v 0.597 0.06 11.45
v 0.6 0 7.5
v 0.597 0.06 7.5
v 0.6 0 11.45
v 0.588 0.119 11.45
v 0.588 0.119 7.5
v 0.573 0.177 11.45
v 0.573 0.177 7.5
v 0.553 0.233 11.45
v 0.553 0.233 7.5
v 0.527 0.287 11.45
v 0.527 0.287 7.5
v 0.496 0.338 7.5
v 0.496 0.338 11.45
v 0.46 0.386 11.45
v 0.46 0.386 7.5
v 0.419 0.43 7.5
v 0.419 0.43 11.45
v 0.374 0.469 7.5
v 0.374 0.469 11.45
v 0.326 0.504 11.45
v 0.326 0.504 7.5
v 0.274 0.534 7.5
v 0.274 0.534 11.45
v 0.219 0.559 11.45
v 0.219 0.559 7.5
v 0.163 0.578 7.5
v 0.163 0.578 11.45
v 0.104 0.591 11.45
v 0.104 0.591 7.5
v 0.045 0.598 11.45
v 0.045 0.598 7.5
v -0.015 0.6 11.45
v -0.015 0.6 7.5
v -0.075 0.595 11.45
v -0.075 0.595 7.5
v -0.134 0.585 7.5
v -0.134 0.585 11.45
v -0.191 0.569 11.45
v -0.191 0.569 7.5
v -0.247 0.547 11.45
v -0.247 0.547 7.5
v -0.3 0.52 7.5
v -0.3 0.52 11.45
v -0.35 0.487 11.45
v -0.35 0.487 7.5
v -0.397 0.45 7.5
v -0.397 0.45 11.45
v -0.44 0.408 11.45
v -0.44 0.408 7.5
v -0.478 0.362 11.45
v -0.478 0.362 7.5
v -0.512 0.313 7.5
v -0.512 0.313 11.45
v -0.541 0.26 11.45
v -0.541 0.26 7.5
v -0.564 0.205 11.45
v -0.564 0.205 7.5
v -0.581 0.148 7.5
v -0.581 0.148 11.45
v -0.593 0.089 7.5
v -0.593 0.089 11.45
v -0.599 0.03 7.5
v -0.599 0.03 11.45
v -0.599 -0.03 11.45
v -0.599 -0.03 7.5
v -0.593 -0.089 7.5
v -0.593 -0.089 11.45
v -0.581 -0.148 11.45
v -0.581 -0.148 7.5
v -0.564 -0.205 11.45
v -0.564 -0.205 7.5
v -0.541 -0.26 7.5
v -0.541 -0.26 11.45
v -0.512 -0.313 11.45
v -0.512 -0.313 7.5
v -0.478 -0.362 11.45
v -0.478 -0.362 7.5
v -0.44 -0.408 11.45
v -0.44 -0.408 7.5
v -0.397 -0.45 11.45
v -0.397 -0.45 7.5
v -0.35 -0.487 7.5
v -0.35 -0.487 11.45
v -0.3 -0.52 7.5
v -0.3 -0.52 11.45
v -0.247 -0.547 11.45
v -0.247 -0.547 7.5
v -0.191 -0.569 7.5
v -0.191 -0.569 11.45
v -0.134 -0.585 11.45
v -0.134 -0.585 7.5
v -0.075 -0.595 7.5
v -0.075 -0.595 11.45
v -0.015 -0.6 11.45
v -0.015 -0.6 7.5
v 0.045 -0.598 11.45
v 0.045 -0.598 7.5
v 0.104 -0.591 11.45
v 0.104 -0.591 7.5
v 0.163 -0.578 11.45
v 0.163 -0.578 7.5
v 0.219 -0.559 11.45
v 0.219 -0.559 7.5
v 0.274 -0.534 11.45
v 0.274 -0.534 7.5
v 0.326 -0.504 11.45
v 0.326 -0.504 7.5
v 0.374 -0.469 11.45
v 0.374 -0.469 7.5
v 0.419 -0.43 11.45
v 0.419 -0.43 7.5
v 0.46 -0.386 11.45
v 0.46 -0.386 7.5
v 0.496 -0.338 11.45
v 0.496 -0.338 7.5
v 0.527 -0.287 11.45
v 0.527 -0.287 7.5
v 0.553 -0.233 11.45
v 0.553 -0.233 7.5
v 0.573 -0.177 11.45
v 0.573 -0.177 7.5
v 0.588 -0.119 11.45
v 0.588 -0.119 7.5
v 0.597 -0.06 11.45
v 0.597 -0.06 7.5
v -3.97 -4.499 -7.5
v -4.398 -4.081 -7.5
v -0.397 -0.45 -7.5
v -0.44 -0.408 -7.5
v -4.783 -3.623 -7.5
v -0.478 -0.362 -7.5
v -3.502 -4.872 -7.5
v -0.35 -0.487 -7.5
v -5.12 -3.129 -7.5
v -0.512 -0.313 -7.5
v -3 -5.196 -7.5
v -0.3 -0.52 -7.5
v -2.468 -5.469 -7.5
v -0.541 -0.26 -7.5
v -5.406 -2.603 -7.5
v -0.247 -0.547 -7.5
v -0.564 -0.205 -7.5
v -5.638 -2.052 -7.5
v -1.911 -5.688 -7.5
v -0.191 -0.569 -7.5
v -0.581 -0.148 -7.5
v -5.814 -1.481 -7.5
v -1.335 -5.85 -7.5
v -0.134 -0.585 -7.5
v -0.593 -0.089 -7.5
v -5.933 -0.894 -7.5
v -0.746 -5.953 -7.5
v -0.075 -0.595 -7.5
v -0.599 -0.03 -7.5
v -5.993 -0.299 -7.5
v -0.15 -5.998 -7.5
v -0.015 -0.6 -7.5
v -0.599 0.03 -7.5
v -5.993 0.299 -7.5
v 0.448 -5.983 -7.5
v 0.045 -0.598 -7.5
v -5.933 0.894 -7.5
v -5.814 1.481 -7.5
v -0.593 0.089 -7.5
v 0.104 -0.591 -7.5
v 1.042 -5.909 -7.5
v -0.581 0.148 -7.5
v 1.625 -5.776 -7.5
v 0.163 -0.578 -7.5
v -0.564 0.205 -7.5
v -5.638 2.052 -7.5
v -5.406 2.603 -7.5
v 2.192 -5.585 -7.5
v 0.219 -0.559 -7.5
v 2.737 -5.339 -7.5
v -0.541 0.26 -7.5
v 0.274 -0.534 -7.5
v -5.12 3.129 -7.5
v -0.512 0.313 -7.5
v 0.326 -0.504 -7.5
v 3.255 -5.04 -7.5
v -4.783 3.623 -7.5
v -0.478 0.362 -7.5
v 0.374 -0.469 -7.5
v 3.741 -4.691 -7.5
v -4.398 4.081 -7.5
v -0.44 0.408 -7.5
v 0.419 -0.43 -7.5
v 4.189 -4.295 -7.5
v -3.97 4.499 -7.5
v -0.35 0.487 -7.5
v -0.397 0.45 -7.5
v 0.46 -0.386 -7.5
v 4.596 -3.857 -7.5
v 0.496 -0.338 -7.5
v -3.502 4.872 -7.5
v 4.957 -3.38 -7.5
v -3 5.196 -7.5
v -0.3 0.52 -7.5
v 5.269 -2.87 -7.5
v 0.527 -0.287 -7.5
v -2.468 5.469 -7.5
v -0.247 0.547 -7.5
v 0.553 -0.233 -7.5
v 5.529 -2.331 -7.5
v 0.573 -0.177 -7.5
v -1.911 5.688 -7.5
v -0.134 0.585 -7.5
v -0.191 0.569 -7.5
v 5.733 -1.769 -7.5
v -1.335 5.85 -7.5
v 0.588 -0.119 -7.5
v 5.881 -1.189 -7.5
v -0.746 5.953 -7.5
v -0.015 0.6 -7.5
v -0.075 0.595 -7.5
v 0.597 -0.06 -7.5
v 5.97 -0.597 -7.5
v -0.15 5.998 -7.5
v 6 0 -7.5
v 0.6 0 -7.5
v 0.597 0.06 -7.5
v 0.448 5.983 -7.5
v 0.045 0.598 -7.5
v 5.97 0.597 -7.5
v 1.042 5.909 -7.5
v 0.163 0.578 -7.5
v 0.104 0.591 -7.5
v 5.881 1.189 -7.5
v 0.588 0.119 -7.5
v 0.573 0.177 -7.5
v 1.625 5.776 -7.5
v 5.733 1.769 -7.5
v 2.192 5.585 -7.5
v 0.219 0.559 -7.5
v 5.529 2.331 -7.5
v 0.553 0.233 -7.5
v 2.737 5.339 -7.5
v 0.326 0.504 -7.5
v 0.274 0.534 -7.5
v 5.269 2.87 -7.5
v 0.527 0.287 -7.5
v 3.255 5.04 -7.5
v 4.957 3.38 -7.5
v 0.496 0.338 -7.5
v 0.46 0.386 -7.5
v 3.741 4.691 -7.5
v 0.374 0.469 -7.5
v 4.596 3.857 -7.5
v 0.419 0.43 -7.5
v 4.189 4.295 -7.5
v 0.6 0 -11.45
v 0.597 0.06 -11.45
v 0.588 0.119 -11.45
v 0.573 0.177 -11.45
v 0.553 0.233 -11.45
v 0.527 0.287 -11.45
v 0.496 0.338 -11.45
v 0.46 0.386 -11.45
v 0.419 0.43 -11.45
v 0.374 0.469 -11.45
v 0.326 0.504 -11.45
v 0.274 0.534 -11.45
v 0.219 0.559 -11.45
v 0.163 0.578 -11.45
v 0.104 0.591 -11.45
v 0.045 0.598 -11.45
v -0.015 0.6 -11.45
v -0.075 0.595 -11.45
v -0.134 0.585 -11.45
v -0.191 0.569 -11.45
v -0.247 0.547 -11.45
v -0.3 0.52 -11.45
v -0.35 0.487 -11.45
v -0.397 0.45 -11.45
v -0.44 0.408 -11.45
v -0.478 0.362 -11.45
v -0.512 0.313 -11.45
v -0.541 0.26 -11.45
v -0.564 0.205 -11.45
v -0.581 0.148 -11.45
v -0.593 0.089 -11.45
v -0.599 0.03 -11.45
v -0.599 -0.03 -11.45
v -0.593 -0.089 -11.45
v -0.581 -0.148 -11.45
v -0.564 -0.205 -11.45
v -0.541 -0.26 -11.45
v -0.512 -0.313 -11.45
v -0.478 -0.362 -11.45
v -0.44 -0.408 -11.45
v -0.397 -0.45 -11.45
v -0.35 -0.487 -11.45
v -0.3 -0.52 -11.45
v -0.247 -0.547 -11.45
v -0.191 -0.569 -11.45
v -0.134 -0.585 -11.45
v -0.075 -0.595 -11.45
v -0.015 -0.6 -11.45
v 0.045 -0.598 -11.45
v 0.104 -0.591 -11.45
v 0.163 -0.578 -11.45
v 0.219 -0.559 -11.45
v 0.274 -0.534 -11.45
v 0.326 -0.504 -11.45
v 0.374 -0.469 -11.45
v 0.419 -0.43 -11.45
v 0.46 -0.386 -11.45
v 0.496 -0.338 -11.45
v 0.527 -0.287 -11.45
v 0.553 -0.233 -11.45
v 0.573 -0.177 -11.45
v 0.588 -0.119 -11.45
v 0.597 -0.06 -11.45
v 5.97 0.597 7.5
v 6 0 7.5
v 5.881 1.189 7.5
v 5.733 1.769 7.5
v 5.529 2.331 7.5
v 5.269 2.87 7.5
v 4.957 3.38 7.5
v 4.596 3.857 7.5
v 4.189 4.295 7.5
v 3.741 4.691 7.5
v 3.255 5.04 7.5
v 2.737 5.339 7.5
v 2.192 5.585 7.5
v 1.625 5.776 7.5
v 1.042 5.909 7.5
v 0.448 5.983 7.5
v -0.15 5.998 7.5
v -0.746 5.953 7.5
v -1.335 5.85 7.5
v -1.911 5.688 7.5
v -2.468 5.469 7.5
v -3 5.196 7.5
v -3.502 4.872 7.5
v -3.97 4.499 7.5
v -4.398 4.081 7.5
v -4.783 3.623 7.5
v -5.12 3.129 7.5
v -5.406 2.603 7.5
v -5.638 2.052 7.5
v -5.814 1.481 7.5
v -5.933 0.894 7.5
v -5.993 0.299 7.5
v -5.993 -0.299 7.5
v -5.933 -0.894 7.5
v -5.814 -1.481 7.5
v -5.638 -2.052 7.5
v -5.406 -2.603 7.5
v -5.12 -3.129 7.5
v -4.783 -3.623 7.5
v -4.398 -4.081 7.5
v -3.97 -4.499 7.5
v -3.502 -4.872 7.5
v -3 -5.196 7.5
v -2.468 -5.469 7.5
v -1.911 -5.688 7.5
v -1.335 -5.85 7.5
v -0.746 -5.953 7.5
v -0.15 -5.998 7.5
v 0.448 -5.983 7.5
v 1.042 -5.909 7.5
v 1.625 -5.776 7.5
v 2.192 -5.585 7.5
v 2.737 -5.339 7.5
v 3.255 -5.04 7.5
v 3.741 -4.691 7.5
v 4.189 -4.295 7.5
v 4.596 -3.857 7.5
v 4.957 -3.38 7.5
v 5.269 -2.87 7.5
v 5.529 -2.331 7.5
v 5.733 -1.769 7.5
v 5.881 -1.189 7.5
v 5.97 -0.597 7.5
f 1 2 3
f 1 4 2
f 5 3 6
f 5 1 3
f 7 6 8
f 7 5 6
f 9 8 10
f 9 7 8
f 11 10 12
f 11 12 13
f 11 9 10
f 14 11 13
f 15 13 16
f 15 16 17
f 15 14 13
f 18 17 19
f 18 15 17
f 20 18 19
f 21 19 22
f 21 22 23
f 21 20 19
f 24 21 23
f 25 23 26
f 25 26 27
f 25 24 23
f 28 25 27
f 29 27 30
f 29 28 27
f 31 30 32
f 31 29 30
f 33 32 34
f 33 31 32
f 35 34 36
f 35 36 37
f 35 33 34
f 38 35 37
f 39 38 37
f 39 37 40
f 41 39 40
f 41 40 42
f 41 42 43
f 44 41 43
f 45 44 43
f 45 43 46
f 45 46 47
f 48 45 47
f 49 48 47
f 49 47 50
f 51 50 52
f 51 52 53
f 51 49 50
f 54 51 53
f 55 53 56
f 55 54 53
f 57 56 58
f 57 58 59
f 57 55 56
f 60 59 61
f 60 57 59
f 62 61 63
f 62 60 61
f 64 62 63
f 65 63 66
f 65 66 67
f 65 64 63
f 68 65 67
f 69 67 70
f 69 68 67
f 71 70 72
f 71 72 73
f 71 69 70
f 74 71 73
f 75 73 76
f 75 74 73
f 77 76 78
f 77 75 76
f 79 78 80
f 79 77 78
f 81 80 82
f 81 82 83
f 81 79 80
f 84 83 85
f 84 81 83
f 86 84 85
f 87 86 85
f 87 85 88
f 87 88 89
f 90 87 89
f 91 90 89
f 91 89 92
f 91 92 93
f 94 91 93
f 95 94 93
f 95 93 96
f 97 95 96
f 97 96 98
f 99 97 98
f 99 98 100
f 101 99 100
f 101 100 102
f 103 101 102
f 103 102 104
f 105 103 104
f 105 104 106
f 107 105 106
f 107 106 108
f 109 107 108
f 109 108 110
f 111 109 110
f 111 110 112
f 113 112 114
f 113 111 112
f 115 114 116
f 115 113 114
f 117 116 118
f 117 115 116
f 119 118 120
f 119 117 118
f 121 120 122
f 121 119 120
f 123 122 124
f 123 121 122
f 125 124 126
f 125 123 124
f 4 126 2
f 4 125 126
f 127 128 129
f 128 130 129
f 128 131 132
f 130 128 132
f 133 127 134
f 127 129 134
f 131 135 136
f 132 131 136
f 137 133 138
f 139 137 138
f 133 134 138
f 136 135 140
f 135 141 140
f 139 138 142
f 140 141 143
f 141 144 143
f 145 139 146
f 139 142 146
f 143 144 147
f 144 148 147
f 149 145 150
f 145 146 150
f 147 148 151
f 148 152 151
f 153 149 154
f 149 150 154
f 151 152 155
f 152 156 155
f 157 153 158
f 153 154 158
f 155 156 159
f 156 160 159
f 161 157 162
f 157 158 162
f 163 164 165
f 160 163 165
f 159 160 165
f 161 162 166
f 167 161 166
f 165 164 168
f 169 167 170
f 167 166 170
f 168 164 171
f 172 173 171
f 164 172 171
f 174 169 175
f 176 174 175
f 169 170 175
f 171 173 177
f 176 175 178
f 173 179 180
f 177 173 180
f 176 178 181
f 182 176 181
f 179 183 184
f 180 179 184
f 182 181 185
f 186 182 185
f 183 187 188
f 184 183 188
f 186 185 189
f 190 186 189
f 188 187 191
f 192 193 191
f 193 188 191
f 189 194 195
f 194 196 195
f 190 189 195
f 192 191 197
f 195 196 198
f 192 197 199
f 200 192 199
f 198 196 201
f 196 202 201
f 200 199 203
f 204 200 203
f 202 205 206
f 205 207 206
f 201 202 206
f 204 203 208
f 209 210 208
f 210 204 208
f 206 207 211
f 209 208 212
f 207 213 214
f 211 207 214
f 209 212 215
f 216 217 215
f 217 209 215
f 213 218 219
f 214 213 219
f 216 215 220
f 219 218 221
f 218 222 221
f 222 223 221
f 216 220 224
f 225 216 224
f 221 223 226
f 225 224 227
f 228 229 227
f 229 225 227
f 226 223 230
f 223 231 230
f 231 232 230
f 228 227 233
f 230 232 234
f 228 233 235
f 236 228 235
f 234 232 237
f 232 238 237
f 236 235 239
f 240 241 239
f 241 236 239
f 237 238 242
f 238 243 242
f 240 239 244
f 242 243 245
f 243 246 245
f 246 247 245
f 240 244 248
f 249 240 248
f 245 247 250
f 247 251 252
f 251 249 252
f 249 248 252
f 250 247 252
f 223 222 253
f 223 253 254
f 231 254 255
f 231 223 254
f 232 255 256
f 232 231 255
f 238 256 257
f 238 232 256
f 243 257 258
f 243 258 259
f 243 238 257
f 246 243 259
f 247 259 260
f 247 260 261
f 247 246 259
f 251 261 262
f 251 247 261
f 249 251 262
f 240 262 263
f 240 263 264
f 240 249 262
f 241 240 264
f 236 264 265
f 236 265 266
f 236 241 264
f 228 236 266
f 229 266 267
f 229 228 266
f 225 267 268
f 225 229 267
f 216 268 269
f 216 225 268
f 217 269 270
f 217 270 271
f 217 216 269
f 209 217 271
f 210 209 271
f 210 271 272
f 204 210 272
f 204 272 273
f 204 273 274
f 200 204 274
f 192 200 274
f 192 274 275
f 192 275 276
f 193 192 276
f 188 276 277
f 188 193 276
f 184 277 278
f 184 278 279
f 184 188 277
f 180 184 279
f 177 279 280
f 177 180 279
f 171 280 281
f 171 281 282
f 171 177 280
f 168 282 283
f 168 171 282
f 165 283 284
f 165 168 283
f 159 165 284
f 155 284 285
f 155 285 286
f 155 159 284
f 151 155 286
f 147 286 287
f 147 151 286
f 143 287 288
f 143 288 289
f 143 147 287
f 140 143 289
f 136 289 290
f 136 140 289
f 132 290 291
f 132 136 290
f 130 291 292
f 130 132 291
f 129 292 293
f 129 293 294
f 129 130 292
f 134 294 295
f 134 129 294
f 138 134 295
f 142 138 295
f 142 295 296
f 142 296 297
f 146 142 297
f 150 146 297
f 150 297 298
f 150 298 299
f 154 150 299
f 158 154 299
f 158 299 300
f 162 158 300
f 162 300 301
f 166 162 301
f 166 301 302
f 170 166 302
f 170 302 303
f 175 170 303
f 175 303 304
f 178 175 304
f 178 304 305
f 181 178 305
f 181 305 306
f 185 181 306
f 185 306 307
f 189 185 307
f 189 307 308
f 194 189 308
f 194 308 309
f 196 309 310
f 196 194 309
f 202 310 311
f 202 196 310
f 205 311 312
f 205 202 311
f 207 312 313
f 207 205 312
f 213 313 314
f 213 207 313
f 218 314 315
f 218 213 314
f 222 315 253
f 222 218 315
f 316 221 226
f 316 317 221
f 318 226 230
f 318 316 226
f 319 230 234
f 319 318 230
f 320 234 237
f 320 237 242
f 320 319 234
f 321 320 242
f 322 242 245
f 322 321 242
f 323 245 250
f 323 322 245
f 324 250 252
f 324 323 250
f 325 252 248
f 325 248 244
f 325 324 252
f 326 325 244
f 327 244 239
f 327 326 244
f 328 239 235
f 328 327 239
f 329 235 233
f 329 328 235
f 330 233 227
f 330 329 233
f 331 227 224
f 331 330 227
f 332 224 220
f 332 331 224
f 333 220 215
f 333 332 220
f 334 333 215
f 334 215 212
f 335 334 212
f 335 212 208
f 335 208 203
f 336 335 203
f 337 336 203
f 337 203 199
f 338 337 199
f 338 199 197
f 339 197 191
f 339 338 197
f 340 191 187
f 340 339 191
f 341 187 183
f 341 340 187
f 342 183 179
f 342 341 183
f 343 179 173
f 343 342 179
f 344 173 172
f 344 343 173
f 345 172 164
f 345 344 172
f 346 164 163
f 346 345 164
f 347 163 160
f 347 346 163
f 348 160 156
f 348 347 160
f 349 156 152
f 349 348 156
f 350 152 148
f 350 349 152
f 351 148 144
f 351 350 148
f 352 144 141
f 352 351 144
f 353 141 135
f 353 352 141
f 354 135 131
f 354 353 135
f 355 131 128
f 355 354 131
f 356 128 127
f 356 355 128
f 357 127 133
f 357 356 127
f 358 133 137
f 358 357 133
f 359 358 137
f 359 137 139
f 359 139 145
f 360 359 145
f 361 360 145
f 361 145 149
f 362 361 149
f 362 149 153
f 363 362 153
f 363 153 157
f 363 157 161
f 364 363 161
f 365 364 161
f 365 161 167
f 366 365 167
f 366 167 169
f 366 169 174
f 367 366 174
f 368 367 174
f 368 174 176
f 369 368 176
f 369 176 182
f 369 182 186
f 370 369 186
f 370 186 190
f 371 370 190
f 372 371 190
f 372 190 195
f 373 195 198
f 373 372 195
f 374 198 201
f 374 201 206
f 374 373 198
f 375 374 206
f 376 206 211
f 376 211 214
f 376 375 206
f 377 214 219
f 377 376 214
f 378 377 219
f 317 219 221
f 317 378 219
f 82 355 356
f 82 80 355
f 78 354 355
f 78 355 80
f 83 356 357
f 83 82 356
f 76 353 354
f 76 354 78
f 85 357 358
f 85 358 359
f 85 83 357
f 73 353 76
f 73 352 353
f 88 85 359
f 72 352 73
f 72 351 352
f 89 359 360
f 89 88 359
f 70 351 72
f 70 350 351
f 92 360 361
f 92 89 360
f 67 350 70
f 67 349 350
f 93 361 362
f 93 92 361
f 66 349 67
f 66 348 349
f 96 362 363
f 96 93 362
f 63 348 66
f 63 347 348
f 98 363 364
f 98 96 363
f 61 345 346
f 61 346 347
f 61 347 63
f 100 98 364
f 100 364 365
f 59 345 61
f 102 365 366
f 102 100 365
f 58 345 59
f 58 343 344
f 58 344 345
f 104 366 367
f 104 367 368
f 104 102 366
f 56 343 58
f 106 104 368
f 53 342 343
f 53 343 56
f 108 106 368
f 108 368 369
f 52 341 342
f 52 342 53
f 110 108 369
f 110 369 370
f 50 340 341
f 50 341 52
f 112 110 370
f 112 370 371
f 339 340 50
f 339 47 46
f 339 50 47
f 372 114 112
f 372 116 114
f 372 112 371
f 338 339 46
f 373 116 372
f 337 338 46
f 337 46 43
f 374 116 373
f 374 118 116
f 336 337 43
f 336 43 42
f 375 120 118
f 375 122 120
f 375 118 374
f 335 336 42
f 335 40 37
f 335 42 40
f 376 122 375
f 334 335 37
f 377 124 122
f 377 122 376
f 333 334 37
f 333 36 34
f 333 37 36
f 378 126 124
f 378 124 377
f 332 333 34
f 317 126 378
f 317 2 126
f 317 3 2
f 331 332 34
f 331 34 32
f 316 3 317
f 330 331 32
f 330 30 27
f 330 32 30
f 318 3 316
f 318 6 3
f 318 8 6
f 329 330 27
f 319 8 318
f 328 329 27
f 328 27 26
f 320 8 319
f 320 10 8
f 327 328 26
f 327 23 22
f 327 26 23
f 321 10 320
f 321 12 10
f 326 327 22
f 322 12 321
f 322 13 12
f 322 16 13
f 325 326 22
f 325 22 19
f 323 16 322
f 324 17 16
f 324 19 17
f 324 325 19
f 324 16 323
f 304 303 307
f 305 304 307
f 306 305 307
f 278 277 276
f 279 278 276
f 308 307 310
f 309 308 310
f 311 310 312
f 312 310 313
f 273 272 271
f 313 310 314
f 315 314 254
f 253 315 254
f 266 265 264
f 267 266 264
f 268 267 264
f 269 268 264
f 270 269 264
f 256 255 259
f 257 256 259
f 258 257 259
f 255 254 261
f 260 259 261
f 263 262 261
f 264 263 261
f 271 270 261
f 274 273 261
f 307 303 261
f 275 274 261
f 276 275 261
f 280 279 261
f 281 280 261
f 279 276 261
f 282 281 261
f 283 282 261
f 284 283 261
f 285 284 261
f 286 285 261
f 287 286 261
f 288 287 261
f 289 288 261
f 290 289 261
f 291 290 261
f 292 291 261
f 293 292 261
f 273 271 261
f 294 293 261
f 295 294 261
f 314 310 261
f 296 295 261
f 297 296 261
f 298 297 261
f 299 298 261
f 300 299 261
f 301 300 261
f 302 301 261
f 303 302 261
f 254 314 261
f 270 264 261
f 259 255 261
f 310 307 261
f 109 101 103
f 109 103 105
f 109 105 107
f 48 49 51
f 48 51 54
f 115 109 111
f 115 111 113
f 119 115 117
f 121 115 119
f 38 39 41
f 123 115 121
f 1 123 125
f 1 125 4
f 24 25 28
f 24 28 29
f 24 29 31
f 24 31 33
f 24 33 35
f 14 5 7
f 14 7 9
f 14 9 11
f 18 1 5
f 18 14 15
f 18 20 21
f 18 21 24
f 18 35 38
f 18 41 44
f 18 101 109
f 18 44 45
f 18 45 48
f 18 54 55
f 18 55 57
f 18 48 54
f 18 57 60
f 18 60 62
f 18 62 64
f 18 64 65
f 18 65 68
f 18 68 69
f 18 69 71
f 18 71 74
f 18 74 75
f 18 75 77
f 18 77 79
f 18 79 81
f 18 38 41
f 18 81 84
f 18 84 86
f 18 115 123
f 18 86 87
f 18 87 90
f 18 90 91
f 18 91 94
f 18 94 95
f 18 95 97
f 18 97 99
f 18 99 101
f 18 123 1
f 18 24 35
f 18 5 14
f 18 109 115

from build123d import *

# Parameters (mm, degrees)
SKETCH1_R           = 6
SKETCH1_R_2         = 0.6
BOSS_EXTRUDE1_DEPTH = 7.5
SKETCH1_2_R         = 0.6
BOSS_EXTRUDE2_DEPTH = 11.45


with BuildPart() as part:
    # Sketch1 → Boss-Extrude1 (new, symmetric)
    with BuildSketch(Plane.XY):
        Circle(SKETCH1_R)
        Circle(SKETCH1_R_2, mode=Mode.SUBTRACT)
    extrude(amount=BOSS_EXTRUDE1_DEPTH, both=True)

    # Sketch1<2> → Boss-Extrude2 (add, symmetric)
    with BuildSketch(Plane.XY):
        Circle(SKETCH1_2_R)
    extrude(amount=BOSS_EXTRUDE2_DEPTH, both=True)


solid = part.part
